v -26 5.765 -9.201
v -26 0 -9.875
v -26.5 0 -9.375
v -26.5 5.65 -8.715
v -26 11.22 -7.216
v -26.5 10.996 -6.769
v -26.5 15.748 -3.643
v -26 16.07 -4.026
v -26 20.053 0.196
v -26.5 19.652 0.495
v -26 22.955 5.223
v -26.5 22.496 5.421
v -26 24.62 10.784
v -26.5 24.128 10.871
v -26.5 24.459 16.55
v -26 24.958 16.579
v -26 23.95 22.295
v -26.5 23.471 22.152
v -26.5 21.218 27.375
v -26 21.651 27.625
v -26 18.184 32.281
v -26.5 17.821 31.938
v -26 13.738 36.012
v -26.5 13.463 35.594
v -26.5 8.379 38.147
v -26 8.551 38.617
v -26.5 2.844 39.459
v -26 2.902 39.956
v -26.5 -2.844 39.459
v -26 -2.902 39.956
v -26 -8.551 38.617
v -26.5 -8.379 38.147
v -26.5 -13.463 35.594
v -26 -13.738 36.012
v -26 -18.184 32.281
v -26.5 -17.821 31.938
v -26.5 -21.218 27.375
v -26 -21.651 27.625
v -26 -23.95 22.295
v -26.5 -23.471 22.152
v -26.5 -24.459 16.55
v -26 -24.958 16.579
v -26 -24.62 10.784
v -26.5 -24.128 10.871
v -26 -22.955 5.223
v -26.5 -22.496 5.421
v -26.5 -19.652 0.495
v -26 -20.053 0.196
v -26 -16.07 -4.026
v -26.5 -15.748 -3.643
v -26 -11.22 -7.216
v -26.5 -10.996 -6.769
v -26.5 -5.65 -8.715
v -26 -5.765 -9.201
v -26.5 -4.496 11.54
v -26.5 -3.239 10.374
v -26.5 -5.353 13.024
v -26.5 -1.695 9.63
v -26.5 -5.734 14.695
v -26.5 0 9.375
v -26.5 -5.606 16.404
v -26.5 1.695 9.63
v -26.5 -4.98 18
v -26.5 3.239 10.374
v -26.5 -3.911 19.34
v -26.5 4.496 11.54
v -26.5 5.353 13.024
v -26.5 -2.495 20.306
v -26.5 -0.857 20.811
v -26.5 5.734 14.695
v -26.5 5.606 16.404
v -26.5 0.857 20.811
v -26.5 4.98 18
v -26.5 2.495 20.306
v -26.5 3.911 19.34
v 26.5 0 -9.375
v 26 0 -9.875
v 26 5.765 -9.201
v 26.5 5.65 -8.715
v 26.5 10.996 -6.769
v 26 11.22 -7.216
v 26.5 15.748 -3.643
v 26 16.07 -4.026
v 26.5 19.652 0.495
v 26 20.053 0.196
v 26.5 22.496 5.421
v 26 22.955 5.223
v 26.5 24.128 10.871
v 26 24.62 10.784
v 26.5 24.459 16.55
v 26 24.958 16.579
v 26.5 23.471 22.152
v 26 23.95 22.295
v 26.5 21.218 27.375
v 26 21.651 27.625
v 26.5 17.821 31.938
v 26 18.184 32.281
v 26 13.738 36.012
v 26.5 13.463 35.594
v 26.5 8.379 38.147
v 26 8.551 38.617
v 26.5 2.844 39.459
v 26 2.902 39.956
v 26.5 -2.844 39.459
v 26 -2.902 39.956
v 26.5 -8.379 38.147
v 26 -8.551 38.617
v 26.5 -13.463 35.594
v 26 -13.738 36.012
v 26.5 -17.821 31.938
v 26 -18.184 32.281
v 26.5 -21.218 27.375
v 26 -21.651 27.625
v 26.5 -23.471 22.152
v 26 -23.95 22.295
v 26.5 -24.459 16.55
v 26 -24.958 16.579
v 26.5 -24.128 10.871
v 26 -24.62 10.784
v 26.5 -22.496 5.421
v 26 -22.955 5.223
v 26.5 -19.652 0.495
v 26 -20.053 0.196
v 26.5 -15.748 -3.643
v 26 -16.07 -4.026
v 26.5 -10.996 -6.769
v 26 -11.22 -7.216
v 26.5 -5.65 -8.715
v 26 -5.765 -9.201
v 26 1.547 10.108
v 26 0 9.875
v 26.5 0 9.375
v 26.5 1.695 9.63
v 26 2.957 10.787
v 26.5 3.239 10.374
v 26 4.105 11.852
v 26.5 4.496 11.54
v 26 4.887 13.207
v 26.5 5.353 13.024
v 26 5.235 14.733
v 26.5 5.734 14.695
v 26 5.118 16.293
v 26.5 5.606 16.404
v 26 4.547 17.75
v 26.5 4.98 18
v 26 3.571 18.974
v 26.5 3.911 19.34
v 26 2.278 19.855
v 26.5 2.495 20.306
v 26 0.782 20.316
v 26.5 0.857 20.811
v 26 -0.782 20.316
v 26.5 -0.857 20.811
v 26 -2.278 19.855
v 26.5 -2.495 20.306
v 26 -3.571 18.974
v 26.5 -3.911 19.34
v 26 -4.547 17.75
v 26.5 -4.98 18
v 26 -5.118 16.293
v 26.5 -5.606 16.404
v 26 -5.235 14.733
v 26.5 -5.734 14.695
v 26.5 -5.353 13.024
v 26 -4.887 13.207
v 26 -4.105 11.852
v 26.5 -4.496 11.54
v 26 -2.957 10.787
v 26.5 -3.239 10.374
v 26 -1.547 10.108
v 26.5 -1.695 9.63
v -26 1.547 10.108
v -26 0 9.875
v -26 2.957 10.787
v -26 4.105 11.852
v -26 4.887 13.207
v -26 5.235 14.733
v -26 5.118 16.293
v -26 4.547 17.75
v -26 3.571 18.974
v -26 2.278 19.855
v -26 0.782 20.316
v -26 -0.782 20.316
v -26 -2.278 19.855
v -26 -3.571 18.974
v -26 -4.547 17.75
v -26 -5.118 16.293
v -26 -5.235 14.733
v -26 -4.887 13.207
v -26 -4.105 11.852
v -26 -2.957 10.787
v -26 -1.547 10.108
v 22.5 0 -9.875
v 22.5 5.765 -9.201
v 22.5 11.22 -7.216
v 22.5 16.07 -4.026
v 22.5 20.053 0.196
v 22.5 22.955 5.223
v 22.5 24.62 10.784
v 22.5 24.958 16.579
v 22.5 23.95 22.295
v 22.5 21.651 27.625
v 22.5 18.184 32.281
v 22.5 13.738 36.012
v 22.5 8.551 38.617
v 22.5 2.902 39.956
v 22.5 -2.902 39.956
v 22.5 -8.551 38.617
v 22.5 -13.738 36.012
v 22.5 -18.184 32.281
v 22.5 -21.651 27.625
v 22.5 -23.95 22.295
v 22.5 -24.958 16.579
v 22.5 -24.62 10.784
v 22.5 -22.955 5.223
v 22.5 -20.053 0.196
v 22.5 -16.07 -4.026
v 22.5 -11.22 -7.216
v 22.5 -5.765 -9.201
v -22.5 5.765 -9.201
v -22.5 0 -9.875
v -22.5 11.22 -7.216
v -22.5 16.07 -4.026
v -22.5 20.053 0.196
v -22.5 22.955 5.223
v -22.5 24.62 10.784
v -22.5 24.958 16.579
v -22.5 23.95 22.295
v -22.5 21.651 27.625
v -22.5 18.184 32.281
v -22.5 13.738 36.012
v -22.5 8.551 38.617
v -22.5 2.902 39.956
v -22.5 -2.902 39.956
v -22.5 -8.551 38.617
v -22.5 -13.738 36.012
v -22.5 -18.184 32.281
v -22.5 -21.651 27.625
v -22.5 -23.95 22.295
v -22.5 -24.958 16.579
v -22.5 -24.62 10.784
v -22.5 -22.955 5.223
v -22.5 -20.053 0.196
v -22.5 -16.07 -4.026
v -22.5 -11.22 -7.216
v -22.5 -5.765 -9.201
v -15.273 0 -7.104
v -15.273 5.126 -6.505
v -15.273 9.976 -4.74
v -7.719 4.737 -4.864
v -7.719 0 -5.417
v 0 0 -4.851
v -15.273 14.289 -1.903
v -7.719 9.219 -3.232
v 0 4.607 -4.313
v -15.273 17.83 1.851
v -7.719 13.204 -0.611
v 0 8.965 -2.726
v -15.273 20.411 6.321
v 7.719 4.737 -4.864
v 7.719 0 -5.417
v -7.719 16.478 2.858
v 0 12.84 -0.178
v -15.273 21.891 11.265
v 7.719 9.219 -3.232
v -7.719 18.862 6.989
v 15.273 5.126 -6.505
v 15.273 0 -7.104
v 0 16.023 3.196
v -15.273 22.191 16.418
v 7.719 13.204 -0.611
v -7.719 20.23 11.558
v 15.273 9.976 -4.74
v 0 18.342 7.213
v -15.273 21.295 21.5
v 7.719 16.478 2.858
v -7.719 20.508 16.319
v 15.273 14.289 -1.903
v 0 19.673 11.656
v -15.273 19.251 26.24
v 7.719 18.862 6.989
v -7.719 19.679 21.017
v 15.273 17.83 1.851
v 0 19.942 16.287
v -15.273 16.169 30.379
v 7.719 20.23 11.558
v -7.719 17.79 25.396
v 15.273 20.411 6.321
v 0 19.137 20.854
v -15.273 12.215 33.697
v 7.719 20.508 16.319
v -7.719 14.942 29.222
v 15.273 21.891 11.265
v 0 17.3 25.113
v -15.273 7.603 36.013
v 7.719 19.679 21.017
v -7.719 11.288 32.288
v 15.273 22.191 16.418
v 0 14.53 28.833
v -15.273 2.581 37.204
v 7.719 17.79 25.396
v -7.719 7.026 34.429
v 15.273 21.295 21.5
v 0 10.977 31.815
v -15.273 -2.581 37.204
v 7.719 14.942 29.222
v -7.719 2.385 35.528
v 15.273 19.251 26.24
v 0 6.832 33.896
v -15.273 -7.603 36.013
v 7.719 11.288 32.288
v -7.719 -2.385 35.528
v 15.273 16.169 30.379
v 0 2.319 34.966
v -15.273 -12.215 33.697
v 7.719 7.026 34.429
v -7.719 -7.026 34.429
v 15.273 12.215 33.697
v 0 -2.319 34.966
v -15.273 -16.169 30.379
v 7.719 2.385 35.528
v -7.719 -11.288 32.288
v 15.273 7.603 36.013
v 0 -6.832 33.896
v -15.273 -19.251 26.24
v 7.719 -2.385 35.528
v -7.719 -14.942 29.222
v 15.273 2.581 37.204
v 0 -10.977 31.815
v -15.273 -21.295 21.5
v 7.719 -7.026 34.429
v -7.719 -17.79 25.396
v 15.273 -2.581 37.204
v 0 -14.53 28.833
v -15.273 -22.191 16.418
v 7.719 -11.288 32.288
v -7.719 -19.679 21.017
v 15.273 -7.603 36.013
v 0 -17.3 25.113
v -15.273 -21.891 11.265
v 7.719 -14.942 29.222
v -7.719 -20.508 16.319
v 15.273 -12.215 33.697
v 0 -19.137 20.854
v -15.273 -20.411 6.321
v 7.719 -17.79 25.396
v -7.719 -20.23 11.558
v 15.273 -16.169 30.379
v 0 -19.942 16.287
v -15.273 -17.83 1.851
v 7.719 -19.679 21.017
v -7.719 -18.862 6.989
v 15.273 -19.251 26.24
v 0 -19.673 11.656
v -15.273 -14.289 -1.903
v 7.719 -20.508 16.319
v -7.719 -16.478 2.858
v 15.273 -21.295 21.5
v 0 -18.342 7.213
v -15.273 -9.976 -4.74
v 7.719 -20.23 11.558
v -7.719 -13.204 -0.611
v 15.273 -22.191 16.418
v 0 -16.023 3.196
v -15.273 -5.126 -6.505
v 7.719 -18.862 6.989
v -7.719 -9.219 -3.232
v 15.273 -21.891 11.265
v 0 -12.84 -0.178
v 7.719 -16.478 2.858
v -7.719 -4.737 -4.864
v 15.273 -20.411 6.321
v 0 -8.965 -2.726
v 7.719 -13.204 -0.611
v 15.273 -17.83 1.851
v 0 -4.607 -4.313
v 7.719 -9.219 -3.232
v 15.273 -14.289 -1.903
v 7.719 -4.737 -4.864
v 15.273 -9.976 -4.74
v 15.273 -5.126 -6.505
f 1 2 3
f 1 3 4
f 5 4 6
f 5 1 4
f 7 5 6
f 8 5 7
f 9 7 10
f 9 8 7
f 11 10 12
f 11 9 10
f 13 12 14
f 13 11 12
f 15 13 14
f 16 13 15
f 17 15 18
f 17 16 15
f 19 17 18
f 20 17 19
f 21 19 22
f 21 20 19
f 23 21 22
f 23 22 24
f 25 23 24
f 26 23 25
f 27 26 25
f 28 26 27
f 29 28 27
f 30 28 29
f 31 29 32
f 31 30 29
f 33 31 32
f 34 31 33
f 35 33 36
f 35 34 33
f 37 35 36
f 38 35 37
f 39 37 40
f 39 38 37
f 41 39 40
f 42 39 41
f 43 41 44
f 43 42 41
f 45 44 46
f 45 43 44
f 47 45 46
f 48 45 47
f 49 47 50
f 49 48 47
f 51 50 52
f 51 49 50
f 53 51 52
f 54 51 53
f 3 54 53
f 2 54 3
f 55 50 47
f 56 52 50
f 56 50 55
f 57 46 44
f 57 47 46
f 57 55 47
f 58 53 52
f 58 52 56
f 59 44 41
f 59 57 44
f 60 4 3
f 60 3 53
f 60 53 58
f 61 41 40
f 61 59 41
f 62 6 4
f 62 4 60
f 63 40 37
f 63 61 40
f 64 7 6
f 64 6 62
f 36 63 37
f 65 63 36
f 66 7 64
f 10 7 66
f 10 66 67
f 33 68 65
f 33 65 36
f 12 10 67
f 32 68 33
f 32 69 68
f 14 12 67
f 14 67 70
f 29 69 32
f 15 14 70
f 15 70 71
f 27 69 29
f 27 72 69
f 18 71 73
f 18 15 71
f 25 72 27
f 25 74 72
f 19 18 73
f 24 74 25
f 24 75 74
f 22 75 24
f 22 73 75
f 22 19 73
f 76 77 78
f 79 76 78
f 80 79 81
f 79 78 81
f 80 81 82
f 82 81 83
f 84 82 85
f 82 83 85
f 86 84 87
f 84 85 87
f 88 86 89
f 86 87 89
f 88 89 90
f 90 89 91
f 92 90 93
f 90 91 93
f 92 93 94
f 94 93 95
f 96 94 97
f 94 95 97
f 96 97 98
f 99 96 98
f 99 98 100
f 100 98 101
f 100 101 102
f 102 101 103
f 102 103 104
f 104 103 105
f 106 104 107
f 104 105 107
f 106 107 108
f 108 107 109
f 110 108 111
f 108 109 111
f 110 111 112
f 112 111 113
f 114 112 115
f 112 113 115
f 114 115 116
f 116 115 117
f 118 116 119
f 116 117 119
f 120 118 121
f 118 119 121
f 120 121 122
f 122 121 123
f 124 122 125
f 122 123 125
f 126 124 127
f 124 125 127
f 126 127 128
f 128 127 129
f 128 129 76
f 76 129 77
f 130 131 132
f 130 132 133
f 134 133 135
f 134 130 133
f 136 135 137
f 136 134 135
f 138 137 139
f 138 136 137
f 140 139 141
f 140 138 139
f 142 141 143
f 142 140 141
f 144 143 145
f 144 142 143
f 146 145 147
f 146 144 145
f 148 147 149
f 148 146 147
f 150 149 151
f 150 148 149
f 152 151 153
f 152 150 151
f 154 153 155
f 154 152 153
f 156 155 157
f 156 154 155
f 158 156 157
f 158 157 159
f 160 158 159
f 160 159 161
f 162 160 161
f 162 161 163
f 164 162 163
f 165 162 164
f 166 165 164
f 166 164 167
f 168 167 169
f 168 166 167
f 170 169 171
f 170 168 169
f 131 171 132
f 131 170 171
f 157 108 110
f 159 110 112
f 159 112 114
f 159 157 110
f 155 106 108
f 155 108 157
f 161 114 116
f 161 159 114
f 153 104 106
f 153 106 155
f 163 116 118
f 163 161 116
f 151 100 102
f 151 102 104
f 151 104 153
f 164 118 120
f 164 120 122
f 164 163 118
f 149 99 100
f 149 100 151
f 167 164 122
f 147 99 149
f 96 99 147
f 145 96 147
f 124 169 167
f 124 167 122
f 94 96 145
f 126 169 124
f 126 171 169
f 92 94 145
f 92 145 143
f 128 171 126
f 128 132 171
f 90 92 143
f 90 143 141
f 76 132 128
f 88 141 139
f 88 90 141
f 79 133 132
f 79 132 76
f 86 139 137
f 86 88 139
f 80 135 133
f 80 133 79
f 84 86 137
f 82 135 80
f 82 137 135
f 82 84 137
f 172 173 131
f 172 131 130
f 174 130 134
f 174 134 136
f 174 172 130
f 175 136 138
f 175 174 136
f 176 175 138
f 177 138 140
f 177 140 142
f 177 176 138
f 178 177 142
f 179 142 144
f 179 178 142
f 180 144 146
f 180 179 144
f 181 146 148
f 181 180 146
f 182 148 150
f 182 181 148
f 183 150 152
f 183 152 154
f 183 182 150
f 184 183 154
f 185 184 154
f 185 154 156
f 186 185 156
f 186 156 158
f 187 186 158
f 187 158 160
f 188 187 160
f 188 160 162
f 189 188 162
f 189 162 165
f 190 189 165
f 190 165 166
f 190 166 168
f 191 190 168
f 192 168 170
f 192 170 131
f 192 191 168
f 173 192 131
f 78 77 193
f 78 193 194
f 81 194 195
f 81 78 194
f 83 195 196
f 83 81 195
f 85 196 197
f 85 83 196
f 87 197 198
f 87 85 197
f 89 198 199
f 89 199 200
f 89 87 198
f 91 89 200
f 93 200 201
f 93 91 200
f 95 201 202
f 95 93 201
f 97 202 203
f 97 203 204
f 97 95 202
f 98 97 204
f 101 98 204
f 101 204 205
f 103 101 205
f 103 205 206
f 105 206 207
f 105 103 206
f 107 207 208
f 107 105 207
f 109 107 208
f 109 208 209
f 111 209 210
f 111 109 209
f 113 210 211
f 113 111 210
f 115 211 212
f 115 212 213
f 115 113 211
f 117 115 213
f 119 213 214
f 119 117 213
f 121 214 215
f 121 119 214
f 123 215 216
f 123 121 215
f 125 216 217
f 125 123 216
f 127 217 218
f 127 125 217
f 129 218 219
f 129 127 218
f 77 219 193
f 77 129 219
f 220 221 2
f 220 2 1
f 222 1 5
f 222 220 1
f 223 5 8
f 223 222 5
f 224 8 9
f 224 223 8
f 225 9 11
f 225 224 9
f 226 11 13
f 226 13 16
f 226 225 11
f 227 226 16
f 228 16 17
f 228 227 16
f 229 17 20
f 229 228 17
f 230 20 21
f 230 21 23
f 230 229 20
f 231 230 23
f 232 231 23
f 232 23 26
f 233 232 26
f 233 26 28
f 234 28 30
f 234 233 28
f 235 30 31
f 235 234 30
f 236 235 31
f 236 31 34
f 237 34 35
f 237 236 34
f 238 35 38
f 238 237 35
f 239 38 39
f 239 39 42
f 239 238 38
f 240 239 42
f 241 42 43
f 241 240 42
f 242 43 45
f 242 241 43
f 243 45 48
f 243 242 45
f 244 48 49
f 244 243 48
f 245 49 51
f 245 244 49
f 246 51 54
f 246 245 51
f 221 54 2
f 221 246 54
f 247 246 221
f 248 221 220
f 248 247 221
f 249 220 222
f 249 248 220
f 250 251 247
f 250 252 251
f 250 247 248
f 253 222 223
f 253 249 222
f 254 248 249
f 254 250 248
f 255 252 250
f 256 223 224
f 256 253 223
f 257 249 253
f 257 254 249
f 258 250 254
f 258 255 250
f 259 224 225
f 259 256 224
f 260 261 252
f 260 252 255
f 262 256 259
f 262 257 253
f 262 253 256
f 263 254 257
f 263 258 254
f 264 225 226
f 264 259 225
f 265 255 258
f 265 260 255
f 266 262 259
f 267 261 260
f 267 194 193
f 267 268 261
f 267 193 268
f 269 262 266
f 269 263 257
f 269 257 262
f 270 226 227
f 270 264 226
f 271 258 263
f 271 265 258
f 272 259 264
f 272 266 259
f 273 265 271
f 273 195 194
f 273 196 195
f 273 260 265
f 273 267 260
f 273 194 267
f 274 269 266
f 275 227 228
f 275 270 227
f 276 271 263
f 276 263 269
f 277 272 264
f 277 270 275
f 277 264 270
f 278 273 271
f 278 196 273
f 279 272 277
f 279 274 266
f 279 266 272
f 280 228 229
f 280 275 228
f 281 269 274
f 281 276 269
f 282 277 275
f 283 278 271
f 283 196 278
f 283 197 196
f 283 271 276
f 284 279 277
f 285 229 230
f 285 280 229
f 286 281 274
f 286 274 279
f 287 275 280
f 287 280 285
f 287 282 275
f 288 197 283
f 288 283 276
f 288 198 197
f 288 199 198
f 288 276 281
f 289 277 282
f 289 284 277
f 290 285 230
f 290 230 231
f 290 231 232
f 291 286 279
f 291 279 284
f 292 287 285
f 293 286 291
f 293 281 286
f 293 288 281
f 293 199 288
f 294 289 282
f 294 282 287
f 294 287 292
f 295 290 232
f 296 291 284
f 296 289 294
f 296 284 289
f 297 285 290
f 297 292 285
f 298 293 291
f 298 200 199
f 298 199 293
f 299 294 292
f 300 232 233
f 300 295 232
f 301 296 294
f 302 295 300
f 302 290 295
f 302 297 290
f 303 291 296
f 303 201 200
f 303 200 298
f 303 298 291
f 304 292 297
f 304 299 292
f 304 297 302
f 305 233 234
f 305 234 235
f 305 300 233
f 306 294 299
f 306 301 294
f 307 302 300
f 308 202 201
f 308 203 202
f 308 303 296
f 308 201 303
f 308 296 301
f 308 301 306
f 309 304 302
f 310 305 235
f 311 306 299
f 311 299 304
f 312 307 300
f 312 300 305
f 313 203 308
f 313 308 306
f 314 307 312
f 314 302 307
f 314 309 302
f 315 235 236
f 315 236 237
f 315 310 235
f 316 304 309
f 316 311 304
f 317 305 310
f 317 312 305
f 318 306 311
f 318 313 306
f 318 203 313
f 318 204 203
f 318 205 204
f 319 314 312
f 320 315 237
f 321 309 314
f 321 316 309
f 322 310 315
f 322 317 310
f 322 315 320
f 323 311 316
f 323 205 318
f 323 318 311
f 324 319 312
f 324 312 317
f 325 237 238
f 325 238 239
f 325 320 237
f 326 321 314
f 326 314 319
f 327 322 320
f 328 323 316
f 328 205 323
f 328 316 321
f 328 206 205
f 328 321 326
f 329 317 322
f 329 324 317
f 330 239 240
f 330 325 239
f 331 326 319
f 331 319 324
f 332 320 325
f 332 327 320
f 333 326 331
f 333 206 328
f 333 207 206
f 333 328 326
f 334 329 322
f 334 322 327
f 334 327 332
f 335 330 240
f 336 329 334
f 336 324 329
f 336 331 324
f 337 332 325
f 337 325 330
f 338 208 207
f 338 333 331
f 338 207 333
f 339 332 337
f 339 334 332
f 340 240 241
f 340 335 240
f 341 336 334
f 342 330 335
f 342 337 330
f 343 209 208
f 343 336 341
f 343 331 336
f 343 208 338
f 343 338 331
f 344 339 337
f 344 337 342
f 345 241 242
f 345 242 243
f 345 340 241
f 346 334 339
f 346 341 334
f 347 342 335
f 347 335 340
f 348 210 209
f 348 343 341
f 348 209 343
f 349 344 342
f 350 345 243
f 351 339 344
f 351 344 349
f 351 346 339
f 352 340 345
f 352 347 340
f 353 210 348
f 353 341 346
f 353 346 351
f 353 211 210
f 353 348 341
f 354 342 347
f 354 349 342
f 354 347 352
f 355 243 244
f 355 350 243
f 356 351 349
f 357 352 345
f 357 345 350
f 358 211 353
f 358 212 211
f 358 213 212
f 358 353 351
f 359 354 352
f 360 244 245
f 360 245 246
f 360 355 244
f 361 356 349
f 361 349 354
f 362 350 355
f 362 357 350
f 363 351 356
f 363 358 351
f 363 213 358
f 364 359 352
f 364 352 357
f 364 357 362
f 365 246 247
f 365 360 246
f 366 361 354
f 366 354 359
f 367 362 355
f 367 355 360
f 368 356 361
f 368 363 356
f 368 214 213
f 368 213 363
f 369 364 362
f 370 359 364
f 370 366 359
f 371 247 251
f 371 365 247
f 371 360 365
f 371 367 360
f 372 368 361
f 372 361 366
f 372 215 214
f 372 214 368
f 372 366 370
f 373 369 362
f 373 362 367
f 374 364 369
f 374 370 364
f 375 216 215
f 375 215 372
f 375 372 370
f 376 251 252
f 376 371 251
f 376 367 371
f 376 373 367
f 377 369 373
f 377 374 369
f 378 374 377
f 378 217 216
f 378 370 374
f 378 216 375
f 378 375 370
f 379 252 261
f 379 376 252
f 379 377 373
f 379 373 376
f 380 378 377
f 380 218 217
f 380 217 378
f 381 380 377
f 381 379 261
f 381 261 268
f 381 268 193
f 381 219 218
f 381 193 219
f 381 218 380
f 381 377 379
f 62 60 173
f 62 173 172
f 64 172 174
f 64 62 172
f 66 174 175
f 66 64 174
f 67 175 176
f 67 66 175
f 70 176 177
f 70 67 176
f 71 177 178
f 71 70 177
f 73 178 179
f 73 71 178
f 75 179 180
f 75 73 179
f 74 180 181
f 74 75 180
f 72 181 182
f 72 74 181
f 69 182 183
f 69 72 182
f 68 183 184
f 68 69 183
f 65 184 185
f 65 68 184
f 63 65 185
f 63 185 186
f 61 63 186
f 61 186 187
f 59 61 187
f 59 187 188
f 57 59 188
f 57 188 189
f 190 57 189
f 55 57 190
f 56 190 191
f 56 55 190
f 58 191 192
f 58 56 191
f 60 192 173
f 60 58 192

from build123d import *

# Parameters (mm, degrees)
F3_SIZE  = 0.5
F4_SIZE2 = 0.5
F4_SIZE  = 0.5


with BuildPart() as f2:
    # F0 (on Front) → F2 (revolve)
    with BuildSketch(Plane.XZ):
        with BuildLine():
            Line((26.5, -9.875), (26.5, 9.875))
            Line((26.5, 9.875), (-26.5, 9.875))
            Line((-26.5, 9.875), (-26.5, -9.875))
            Line((-26.5, -9.875), (-22.5, -9.875))
            ThreePointArc((-22.5, -9.875), (0, -4.8510921188), (22.5, -9.875))
            Line((22.5, -9.875), (26.5, -9.875))
        make_face()
    revolve(axis=Axis((0, 0, 15.125), (1, 0, 0)))

    # F3
    f3_edges = [f2.edges().sort_by_distance(p)[0] for p in [
        (26.5, 0, 40.125),
        (-26.5, 0, 40.125),
    ]]
    chamfer(f3_edges, length=F3_SIZE)

    # F4
    f4_edges = [f2.edges().sort_by_distance(p)[0] for p in [
        (26.5, 0, 20.375),
        (-26.5, 0, 20.375),
    ]]
    chamfer(f4_edges, length=F4_SIZE, length2=F4_SIZE2)


solid = f2.part
